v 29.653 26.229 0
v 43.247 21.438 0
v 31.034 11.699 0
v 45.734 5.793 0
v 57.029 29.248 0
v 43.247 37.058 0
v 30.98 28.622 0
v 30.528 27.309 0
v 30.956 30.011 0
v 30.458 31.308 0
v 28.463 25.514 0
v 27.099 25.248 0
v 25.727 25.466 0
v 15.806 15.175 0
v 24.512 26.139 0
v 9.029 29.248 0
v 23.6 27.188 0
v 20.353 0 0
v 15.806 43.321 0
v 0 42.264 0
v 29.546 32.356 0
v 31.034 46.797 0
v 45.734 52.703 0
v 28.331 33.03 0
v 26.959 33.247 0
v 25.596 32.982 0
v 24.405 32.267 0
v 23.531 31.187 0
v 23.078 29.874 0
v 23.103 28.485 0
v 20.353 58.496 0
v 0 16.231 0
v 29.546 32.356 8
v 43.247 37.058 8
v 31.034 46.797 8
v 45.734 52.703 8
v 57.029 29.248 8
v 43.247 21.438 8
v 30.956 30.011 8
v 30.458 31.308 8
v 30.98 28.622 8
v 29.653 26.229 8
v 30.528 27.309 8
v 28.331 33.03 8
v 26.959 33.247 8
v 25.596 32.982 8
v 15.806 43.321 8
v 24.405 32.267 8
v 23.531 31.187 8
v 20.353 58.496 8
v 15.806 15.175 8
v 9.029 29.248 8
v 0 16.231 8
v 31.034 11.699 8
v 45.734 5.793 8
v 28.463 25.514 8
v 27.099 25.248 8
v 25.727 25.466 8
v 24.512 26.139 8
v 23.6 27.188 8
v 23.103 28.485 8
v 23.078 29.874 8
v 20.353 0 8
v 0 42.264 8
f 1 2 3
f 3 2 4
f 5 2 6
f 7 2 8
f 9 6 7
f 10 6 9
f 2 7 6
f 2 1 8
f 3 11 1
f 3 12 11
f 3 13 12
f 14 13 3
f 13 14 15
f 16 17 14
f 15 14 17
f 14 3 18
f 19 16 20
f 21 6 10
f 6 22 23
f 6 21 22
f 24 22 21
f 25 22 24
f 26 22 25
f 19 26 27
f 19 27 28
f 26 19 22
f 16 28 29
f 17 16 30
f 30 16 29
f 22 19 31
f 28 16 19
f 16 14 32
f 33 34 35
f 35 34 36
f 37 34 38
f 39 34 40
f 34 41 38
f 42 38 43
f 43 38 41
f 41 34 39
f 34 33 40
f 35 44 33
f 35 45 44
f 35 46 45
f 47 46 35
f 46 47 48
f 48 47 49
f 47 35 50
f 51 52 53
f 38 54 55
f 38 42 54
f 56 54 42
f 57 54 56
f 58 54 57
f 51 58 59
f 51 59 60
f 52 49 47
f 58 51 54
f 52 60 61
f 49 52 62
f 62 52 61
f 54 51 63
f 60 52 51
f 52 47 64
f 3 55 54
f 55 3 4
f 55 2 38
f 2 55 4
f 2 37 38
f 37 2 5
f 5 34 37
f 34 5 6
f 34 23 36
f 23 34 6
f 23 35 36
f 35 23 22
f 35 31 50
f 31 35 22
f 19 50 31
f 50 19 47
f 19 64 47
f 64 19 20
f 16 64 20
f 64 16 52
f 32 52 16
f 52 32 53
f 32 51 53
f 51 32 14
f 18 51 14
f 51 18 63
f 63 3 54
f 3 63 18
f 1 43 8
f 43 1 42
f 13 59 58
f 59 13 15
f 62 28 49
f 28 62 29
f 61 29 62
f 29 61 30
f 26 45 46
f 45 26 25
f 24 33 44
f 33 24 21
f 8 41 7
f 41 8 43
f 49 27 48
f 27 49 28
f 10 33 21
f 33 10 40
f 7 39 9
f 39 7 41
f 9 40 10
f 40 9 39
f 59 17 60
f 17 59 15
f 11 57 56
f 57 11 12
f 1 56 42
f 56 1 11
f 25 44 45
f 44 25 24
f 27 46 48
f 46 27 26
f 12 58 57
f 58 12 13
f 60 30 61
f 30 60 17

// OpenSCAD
$fn = 32;

// ----------------------------------------------------------------------
// Star wheel: 7-point star, R30
// ----------------------------------------------------------------------

// --- parameters (mm) ---
n_points = 7;             // number of points / teeth
r_out = 30;               // tip radius
r_in = 18;                // root radius
bore_r = 4;               // centre bore radius
plate_t = 8;              // plate thickness, Z (extrusion height)
bore_d = 8;               // centre bore diameter

profile = [[57.029, 29.248], [43.247, 37.058], [45.734, 52.703], [31.034, 46.797], [20.353, 58.496], [15.806, 43.321], [0, 42.264], [9.029, 29.248], [0, 16.231], [15.806, 15.175], [20.353, 0], [31.034, 11.699], [45.734, 5.793], [43.247, 21.438]];  // primary outline, 14 points, counter clockwise
void_1 = [[30.956, 30.011], [30.458, 31.308], [29.546, 32.356], [28.331, 33.03], [26.959, 33.247], [25.596, 32.982], [24.405, 32.267], [23.531, 31.187], [23.078, 29.874], [23.103, 28.485], [23.6, 27.188], [24.512, 26.139], [25.727, 25.466], [27.099, 25.248], [28.463, 25.514], [29.653, 26.229], [30.528, 27.309], [30.98, 28.622]];  // centre bore, 18 points

// --- the one profile operation ---
difference() {
  linear_extrude(height = plate_t) polygon(points = profile);
  translate([0, 0, -1])
    linear_extrude(height = plate_t + 2) polygon(points = void_1);
}
